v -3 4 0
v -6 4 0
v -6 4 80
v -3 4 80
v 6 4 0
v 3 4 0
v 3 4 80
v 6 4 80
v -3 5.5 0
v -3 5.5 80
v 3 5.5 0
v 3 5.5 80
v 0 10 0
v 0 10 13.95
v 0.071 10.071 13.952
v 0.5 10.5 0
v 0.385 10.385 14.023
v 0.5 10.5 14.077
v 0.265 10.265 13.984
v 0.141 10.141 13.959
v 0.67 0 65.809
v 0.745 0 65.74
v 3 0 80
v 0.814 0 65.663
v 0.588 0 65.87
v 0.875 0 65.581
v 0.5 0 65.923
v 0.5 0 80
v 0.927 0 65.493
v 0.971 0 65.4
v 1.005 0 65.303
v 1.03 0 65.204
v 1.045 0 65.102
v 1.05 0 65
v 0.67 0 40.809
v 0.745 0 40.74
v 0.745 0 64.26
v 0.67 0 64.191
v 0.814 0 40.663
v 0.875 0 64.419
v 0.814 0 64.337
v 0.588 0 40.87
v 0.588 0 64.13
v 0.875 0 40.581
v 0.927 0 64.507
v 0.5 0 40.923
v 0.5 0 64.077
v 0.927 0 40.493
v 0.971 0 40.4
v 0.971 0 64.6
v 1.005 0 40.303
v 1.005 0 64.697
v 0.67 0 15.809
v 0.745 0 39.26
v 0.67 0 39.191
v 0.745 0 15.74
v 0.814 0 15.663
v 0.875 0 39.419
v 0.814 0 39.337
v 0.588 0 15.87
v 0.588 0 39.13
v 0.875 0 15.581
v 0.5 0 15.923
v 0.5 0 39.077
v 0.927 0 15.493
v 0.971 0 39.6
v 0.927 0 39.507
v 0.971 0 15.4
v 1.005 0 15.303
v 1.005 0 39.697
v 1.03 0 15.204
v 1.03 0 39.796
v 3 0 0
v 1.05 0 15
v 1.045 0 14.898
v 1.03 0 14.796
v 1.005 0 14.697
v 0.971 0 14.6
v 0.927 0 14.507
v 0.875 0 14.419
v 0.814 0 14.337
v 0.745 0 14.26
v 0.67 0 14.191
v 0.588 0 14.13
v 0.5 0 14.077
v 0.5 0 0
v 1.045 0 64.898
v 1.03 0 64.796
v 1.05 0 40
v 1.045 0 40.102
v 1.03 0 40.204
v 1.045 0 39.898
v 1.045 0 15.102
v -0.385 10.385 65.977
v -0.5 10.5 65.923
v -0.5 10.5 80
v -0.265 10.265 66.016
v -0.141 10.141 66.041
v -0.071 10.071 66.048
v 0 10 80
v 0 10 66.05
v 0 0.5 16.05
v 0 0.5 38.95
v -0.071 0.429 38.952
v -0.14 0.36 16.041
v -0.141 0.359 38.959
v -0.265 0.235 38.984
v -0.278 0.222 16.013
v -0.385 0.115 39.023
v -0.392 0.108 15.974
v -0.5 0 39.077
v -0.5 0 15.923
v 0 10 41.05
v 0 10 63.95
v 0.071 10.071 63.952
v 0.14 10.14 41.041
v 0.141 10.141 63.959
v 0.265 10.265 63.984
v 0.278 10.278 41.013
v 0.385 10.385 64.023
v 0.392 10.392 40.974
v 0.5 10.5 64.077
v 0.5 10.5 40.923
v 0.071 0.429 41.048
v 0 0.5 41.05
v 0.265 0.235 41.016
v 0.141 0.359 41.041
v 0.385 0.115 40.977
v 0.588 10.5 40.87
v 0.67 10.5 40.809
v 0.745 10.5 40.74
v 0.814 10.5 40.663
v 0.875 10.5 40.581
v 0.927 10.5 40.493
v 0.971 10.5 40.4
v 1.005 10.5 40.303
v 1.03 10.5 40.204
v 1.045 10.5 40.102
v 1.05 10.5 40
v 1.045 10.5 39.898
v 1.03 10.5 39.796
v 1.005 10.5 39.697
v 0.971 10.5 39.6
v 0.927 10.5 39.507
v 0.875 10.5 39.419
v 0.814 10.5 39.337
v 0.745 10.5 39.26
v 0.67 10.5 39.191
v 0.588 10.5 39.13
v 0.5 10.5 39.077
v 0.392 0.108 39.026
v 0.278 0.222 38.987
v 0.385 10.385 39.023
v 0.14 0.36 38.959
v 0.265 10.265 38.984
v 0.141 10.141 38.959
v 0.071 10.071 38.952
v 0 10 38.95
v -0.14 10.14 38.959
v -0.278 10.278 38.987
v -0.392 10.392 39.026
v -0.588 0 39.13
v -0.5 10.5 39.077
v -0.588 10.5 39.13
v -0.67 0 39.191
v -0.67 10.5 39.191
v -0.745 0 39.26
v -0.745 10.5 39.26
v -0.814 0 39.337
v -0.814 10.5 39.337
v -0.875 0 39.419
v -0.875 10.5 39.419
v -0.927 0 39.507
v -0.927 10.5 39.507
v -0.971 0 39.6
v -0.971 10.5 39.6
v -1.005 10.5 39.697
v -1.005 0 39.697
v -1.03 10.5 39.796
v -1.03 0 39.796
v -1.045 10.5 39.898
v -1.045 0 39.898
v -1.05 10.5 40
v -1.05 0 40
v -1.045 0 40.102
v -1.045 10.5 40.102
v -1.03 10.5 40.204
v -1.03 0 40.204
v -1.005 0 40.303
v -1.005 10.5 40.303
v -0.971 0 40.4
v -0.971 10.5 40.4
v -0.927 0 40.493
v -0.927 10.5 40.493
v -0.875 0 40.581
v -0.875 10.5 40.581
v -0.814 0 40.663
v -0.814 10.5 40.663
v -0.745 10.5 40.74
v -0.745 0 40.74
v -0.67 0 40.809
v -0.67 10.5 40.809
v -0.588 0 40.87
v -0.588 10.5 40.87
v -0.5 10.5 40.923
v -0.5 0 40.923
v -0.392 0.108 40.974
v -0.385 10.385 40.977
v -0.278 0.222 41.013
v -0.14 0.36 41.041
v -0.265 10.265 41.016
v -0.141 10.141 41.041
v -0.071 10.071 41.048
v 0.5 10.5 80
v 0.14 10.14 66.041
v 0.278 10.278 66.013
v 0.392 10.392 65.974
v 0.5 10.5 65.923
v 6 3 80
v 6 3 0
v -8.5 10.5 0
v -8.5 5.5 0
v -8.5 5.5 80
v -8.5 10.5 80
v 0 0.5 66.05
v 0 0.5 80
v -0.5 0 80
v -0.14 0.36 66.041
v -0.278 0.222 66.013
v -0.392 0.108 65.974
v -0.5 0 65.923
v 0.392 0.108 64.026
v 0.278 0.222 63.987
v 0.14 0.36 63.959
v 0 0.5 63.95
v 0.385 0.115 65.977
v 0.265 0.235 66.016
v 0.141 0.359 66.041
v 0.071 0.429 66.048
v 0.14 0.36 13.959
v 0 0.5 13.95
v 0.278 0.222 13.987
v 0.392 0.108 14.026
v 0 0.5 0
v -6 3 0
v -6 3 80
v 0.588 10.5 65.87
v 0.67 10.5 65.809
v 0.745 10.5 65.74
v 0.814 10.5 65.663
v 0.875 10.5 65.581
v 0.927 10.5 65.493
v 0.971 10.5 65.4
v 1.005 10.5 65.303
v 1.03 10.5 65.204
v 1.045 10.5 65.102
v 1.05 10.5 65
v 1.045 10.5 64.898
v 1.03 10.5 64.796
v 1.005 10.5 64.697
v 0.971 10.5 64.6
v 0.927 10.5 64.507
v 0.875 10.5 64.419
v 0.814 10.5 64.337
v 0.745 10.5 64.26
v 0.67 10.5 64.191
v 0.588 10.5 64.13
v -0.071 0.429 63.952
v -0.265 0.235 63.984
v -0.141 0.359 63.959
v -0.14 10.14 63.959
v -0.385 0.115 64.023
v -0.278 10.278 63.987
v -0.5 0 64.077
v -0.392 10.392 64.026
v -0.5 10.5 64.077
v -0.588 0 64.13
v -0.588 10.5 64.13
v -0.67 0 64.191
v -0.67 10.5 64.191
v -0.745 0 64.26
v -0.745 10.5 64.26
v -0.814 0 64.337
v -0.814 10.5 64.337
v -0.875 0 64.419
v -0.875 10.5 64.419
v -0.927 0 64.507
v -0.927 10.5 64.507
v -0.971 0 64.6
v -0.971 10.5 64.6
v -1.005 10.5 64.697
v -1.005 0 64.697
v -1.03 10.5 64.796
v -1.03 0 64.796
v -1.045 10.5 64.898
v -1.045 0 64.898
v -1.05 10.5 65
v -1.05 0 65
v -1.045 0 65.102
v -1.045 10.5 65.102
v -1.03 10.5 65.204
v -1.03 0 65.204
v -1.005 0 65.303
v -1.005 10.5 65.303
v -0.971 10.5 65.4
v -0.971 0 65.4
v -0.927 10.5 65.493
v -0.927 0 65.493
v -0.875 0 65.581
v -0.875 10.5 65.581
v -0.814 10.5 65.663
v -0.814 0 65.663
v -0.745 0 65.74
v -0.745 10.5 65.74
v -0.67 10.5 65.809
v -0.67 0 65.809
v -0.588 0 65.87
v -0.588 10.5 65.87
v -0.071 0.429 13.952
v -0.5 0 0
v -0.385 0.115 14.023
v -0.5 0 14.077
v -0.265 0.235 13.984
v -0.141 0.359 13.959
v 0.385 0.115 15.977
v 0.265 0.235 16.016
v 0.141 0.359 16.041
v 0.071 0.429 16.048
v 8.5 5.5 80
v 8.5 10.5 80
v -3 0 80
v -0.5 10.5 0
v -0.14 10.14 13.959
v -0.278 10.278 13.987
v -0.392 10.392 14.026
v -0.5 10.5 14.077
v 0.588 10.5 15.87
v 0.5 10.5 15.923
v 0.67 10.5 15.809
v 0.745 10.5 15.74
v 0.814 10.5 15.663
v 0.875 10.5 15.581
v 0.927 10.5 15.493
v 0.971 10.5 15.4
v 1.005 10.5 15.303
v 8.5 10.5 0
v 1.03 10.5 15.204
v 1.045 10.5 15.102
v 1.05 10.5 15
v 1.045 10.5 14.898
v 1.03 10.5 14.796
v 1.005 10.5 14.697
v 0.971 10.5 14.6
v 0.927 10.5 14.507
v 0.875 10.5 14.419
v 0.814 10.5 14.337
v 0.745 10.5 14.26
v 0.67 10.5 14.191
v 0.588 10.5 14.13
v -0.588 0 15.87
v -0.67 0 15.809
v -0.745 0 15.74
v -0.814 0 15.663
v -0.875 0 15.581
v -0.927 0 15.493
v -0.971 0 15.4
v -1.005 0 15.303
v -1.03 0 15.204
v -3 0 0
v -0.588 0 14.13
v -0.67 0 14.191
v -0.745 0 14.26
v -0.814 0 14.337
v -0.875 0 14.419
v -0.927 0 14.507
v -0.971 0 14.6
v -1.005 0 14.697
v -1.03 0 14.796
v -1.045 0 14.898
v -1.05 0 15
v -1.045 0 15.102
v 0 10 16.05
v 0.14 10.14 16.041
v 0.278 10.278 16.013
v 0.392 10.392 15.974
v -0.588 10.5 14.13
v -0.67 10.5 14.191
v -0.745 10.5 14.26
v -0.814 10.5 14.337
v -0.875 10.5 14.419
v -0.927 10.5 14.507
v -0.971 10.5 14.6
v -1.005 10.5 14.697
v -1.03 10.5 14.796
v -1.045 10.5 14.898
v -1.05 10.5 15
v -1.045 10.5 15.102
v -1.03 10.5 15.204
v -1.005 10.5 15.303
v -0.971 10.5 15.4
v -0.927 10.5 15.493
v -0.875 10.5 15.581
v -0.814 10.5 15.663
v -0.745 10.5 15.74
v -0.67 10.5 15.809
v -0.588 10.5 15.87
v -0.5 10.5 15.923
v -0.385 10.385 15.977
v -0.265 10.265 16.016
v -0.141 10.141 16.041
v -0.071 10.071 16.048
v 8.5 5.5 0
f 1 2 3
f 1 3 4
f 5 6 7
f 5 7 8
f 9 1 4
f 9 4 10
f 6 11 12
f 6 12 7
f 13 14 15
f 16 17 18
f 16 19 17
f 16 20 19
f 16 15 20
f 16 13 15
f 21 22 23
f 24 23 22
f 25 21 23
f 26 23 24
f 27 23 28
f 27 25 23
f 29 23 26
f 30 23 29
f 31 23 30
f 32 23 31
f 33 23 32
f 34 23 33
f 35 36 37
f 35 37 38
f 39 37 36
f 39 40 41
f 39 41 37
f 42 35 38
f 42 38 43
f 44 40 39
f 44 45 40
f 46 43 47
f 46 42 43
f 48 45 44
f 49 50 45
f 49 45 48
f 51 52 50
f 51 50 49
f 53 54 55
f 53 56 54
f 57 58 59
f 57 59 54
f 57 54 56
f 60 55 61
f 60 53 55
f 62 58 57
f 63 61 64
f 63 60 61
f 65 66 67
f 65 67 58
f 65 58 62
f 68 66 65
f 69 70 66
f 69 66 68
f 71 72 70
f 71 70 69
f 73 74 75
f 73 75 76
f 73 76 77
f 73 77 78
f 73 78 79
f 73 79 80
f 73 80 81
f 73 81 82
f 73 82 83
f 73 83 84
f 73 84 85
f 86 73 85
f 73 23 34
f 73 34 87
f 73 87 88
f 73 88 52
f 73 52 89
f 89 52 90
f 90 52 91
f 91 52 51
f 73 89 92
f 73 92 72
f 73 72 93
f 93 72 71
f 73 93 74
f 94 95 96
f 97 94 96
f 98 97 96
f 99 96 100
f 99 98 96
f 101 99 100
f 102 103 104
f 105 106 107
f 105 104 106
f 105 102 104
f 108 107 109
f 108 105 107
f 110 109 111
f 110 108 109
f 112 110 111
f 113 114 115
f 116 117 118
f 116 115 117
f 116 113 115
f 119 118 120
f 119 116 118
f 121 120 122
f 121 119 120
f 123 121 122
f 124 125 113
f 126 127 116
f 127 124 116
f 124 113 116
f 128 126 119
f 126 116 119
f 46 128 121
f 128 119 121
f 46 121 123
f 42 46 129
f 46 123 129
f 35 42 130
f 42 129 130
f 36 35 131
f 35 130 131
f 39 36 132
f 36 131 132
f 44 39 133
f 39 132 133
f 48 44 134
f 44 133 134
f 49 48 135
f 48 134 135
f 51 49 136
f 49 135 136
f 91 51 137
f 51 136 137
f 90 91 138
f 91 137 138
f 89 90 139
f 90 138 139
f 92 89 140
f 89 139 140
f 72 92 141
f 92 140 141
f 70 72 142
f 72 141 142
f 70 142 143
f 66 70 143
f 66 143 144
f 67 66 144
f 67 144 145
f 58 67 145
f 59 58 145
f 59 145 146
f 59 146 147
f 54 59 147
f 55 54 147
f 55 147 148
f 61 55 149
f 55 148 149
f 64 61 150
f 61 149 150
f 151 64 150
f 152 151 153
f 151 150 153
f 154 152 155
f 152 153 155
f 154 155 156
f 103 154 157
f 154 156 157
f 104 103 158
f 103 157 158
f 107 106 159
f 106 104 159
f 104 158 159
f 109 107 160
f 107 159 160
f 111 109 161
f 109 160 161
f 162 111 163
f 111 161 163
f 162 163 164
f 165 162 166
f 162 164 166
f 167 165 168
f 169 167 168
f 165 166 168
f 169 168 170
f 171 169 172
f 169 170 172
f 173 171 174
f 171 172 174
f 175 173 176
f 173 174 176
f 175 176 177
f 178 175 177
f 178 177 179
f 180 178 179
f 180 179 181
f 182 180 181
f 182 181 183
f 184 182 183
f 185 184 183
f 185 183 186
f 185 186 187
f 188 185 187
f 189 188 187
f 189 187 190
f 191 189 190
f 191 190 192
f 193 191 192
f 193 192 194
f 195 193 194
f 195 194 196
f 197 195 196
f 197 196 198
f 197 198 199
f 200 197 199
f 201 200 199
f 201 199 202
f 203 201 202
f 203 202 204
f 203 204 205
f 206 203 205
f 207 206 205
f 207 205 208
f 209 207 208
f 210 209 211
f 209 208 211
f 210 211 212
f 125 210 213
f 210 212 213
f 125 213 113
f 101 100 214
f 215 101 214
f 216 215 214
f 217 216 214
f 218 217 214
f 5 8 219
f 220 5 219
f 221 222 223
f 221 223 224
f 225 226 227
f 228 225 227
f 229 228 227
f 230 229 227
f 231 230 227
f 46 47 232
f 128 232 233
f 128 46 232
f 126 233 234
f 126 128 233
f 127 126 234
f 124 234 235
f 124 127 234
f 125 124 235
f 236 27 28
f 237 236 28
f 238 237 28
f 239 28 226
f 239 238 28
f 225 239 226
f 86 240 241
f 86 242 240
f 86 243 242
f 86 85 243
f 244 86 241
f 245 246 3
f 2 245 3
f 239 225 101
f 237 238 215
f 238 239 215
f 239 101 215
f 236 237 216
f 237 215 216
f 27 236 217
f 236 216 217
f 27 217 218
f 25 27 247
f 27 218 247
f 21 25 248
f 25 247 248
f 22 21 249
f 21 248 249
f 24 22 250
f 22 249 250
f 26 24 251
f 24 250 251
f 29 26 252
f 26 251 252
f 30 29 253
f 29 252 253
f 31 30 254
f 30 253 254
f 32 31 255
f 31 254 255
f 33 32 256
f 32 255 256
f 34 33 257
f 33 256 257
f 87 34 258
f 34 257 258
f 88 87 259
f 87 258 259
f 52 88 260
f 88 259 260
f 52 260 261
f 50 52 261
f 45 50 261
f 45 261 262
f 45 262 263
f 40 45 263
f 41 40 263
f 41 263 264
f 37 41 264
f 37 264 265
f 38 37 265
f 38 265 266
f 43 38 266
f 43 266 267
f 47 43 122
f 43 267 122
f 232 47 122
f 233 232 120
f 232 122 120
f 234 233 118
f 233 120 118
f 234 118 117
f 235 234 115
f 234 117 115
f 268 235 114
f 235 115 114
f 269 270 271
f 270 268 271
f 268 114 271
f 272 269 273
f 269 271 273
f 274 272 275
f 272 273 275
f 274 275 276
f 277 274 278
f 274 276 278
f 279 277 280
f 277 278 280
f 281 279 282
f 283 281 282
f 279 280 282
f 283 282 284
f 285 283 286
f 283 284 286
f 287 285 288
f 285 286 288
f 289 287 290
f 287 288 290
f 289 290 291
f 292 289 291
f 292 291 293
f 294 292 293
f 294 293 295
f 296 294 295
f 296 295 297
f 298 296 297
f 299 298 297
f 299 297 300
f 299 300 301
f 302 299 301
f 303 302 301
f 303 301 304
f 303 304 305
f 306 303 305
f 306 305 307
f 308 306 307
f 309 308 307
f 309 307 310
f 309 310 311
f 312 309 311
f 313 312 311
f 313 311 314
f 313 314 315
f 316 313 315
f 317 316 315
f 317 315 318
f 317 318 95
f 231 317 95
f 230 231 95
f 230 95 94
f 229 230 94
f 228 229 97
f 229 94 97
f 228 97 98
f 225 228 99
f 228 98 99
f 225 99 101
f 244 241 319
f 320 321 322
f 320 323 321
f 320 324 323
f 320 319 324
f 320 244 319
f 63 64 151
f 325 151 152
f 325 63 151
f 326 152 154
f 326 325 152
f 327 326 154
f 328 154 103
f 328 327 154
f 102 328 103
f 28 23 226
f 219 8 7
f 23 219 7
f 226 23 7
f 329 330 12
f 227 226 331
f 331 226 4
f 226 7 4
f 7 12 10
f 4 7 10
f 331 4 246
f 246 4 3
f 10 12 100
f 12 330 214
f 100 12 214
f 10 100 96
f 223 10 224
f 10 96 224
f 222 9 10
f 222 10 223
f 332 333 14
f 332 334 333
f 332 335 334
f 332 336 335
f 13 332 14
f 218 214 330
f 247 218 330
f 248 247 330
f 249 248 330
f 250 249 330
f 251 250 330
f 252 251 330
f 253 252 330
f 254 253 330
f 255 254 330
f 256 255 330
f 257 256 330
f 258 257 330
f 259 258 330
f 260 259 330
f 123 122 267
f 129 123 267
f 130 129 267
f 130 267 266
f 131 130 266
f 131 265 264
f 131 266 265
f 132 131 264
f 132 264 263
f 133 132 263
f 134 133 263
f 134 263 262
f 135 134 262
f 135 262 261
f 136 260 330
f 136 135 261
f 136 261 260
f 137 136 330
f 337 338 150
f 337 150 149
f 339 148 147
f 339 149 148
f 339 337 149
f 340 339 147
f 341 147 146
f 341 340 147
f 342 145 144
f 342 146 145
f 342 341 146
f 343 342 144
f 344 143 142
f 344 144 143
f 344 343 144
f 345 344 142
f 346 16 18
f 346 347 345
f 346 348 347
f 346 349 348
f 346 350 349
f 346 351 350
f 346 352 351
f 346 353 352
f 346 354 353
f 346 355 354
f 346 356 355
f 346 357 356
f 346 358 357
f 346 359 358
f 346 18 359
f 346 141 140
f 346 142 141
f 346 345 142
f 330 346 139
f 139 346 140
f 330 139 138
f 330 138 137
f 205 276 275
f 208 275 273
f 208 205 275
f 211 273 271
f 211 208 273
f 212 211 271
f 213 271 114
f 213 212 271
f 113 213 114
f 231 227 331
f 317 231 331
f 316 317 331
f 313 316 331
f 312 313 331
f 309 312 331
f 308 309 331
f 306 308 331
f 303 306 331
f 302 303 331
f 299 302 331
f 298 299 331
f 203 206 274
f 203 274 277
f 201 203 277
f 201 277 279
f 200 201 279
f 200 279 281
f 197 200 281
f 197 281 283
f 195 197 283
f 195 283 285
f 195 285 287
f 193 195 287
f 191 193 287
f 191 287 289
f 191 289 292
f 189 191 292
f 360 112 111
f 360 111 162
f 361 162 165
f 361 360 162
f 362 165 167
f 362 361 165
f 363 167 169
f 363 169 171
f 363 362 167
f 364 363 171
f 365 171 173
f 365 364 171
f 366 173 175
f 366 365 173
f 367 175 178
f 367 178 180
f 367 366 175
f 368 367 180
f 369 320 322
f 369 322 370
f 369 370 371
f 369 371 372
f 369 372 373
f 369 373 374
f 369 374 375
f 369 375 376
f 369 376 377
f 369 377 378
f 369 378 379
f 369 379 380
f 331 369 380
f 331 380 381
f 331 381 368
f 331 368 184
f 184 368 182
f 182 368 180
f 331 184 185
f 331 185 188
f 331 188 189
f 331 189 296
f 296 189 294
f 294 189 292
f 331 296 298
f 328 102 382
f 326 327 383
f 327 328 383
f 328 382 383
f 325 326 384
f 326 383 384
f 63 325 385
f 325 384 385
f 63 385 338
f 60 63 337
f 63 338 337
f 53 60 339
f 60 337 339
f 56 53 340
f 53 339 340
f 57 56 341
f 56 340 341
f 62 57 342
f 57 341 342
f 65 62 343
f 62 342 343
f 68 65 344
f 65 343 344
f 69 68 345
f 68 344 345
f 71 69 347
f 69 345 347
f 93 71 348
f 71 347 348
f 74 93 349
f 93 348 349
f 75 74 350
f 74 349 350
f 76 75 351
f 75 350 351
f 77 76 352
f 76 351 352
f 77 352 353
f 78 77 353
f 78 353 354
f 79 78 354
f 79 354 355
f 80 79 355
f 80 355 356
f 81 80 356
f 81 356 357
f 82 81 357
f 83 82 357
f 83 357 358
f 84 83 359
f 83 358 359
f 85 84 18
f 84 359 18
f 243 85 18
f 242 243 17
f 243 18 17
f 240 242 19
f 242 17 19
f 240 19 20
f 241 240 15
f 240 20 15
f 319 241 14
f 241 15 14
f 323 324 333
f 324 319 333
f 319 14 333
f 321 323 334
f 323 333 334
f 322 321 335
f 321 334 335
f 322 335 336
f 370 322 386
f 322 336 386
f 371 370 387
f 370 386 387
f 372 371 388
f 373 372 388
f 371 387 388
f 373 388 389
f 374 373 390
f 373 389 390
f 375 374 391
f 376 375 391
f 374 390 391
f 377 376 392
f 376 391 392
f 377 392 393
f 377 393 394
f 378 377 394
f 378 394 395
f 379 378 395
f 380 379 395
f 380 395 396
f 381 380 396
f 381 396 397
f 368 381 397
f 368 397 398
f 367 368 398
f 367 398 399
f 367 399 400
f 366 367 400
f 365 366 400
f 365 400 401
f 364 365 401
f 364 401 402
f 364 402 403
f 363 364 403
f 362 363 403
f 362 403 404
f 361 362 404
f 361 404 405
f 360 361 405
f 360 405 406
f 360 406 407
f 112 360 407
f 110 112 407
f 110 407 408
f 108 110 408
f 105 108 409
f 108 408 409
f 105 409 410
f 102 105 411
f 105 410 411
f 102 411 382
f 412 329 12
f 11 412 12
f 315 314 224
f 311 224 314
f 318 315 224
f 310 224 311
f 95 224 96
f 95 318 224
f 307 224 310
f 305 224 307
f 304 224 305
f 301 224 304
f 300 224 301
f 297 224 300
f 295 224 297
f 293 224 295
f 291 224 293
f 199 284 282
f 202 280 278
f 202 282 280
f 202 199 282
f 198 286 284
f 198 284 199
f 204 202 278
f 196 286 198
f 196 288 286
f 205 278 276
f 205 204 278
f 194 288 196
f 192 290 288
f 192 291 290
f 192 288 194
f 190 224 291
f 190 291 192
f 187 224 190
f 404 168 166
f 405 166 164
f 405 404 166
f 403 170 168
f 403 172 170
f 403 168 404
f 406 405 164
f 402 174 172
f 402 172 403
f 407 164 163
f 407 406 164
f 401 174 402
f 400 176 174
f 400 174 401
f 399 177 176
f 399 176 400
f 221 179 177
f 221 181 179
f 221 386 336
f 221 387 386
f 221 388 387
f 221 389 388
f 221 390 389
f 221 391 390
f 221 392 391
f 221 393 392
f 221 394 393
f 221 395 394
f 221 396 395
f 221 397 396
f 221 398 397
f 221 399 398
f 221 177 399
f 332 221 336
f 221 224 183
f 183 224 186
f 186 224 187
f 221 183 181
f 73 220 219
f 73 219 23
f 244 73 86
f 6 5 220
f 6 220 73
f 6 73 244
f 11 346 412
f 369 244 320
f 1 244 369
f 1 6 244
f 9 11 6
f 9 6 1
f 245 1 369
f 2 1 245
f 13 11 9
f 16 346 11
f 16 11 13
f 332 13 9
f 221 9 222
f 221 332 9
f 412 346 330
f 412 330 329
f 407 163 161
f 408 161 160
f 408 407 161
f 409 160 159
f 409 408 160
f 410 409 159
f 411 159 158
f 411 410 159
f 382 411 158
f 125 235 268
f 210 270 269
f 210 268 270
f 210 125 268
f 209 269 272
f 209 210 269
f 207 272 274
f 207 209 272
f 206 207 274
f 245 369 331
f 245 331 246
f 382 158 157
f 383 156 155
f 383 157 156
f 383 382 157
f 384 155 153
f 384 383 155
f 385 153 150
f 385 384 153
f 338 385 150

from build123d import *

# Parameters (mm, degrees)
BOSS_EXTRU_1_DEPTH      = 80
ESQUISSE2_R             = 1.05
ENL_V_MAT_EXTRU_1_DEPTH = 82.132607502


with BuildPart() as part:
    # Esquisse1 → Boss.-Extru.1 (new body)
    with BuildSketch(Plane.XY):
        Polygon((0, 10), (0.5, 10.5), (8.5, 10.5), (8.5, 5.5), (3, 5.5), (3, 4), (6, 4), (6, 3), (3, 0), (0.5, 0), (0, 0.5), (-0.5, 0), (-3, 0), (-6, 3), (-6, 4), (-3, 4), (-3, 5.5), (-8.5, 5.5), (-8.5, 10.5), (-0.5, 10.5), align=None)
    extrude(amount=BOSS_EXTRU_1_DEPTH)

    # Esquisse2 → Enlèv. mat.-Extru.1 (cut, through all)
    with BuildSketch(Plane(origin=(0, 10.5, 0), x_dir=(1, 0, 0), z_dir=(0, 1, 0))):
        with Locations(Location((0, -65, 0), (0, 0, 270))):
            Circle(ESQUISSE2_R)
        with Locations(Location((0, -40, 0), (0, 0, 270))):
            Circle(ESQUISSE2_R)
        with Locations(Location((0, -15, 0), (0, 0, 270))):
            Circle(ESQUISSE2_R)
    extrude(amount=-ENL_V_MAT_EXTRU_1_DEPTH, mode=Mode.SUBTRACT)


solid = part.part
